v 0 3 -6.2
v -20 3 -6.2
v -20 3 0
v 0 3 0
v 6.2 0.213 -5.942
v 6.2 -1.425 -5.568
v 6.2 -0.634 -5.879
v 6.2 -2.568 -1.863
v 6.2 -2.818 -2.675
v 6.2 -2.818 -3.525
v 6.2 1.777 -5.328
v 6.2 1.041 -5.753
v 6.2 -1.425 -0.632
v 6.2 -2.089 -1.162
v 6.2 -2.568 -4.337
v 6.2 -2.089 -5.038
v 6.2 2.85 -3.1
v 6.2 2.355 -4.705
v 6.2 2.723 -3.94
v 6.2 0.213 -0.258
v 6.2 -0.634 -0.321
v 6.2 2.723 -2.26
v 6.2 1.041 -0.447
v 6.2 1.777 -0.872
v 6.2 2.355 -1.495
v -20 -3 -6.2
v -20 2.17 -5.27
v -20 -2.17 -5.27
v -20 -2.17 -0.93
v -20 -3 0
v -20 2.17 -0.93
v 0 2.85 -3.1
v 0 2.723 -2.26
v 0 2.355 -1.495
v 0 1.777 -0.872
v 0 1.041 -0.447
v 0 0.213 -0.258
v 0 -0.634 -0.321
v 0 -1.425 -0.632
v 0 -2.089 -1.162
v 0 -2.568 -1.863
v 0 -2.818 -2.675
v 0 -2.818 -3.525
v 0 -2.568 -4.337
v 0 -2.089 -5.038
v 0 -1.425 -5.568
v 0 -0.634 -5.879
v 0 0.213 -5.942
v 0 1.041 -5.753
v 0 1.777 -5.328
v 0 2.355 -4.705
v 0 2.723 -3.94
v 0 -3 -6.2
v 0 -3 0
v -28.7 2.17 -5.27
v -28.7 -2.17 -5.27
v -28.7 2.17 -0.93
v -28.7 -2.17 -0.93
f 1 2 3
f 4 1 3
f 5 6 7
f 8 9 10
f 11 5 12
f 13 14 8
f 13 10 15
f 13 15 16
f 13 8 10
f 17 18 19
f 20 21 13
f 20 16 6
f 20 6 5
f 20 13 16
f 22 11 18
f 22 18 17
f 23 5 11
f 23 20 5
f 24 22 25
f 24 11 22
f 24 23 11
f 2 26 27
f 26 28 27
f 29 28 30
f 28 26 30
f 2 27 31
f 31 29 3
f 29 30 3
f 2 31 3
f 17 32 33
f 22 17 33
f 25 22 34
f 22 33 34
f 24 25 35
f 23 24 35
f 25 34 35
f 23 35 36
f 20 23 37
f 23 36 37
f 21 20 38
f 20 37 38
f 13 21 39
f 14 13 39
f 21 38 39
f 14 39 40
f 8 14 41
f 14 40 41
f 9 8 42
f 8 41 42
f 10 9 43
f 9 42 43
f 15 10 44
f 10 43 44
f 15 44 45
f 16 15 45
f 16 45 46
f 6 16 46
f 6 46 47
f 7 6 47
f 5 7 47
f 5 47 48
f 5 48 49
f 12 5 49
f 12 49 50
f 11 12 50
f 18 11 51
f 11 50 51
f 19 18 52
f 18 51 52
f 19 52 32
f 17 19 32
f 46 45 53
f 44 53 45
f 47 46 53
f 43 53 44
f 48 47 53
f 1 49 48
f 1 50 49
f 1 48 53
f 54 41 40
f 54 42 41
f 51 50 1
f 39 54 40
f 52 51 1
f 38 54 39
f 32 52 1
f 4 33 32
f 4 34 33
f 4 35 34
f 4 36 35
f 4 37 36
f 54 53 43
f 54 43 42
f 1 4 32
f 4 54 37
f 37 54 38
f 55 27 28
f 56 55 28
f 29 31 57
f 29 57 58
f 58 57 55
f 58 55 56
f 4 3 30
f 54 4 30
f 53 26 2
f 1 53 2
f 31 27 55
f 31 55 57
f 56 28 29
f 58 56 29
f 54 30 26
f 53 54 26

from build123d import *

# Parameters (mm, degrees)
F1_DEPTH = 20
F2_R     = 2.85
F3_DEPTH = 6.2
F4_W     = 4.34
F4_H     = 4.34
F5_DEPTH = 8.7


with BuildPart() as f1:
    # F0 (on Right) → F1 (new body)
    with BuildSketch(Plane.YZ):
        Polygon((-3, 0), (-3, -6.2), (3, -6.2), (3, 0), (1.85, 0), (-1.85, 0), align=None)
    extrude(amount=-F1_DEPTH)

    # F2 (on face) → F3 (join)
    with BuildSketch(Plane.YZ):
        with Locations((0, -3.1)):
            Circle(F2_R)
    extrude(amount=F3_DEPTH)

    # F4 (on face) → F5 (join)
    with BuildSketch(Plane(origin=(-20, 0, 0), x_dir=(0, -1, 0), z_dir=(-1, 0, 0))):
        with Locations((0, -3.1)):
            Rectangle(F4_W, F4_H)
    extrude(amount=F5_DEPTH)


solid = f1.part
